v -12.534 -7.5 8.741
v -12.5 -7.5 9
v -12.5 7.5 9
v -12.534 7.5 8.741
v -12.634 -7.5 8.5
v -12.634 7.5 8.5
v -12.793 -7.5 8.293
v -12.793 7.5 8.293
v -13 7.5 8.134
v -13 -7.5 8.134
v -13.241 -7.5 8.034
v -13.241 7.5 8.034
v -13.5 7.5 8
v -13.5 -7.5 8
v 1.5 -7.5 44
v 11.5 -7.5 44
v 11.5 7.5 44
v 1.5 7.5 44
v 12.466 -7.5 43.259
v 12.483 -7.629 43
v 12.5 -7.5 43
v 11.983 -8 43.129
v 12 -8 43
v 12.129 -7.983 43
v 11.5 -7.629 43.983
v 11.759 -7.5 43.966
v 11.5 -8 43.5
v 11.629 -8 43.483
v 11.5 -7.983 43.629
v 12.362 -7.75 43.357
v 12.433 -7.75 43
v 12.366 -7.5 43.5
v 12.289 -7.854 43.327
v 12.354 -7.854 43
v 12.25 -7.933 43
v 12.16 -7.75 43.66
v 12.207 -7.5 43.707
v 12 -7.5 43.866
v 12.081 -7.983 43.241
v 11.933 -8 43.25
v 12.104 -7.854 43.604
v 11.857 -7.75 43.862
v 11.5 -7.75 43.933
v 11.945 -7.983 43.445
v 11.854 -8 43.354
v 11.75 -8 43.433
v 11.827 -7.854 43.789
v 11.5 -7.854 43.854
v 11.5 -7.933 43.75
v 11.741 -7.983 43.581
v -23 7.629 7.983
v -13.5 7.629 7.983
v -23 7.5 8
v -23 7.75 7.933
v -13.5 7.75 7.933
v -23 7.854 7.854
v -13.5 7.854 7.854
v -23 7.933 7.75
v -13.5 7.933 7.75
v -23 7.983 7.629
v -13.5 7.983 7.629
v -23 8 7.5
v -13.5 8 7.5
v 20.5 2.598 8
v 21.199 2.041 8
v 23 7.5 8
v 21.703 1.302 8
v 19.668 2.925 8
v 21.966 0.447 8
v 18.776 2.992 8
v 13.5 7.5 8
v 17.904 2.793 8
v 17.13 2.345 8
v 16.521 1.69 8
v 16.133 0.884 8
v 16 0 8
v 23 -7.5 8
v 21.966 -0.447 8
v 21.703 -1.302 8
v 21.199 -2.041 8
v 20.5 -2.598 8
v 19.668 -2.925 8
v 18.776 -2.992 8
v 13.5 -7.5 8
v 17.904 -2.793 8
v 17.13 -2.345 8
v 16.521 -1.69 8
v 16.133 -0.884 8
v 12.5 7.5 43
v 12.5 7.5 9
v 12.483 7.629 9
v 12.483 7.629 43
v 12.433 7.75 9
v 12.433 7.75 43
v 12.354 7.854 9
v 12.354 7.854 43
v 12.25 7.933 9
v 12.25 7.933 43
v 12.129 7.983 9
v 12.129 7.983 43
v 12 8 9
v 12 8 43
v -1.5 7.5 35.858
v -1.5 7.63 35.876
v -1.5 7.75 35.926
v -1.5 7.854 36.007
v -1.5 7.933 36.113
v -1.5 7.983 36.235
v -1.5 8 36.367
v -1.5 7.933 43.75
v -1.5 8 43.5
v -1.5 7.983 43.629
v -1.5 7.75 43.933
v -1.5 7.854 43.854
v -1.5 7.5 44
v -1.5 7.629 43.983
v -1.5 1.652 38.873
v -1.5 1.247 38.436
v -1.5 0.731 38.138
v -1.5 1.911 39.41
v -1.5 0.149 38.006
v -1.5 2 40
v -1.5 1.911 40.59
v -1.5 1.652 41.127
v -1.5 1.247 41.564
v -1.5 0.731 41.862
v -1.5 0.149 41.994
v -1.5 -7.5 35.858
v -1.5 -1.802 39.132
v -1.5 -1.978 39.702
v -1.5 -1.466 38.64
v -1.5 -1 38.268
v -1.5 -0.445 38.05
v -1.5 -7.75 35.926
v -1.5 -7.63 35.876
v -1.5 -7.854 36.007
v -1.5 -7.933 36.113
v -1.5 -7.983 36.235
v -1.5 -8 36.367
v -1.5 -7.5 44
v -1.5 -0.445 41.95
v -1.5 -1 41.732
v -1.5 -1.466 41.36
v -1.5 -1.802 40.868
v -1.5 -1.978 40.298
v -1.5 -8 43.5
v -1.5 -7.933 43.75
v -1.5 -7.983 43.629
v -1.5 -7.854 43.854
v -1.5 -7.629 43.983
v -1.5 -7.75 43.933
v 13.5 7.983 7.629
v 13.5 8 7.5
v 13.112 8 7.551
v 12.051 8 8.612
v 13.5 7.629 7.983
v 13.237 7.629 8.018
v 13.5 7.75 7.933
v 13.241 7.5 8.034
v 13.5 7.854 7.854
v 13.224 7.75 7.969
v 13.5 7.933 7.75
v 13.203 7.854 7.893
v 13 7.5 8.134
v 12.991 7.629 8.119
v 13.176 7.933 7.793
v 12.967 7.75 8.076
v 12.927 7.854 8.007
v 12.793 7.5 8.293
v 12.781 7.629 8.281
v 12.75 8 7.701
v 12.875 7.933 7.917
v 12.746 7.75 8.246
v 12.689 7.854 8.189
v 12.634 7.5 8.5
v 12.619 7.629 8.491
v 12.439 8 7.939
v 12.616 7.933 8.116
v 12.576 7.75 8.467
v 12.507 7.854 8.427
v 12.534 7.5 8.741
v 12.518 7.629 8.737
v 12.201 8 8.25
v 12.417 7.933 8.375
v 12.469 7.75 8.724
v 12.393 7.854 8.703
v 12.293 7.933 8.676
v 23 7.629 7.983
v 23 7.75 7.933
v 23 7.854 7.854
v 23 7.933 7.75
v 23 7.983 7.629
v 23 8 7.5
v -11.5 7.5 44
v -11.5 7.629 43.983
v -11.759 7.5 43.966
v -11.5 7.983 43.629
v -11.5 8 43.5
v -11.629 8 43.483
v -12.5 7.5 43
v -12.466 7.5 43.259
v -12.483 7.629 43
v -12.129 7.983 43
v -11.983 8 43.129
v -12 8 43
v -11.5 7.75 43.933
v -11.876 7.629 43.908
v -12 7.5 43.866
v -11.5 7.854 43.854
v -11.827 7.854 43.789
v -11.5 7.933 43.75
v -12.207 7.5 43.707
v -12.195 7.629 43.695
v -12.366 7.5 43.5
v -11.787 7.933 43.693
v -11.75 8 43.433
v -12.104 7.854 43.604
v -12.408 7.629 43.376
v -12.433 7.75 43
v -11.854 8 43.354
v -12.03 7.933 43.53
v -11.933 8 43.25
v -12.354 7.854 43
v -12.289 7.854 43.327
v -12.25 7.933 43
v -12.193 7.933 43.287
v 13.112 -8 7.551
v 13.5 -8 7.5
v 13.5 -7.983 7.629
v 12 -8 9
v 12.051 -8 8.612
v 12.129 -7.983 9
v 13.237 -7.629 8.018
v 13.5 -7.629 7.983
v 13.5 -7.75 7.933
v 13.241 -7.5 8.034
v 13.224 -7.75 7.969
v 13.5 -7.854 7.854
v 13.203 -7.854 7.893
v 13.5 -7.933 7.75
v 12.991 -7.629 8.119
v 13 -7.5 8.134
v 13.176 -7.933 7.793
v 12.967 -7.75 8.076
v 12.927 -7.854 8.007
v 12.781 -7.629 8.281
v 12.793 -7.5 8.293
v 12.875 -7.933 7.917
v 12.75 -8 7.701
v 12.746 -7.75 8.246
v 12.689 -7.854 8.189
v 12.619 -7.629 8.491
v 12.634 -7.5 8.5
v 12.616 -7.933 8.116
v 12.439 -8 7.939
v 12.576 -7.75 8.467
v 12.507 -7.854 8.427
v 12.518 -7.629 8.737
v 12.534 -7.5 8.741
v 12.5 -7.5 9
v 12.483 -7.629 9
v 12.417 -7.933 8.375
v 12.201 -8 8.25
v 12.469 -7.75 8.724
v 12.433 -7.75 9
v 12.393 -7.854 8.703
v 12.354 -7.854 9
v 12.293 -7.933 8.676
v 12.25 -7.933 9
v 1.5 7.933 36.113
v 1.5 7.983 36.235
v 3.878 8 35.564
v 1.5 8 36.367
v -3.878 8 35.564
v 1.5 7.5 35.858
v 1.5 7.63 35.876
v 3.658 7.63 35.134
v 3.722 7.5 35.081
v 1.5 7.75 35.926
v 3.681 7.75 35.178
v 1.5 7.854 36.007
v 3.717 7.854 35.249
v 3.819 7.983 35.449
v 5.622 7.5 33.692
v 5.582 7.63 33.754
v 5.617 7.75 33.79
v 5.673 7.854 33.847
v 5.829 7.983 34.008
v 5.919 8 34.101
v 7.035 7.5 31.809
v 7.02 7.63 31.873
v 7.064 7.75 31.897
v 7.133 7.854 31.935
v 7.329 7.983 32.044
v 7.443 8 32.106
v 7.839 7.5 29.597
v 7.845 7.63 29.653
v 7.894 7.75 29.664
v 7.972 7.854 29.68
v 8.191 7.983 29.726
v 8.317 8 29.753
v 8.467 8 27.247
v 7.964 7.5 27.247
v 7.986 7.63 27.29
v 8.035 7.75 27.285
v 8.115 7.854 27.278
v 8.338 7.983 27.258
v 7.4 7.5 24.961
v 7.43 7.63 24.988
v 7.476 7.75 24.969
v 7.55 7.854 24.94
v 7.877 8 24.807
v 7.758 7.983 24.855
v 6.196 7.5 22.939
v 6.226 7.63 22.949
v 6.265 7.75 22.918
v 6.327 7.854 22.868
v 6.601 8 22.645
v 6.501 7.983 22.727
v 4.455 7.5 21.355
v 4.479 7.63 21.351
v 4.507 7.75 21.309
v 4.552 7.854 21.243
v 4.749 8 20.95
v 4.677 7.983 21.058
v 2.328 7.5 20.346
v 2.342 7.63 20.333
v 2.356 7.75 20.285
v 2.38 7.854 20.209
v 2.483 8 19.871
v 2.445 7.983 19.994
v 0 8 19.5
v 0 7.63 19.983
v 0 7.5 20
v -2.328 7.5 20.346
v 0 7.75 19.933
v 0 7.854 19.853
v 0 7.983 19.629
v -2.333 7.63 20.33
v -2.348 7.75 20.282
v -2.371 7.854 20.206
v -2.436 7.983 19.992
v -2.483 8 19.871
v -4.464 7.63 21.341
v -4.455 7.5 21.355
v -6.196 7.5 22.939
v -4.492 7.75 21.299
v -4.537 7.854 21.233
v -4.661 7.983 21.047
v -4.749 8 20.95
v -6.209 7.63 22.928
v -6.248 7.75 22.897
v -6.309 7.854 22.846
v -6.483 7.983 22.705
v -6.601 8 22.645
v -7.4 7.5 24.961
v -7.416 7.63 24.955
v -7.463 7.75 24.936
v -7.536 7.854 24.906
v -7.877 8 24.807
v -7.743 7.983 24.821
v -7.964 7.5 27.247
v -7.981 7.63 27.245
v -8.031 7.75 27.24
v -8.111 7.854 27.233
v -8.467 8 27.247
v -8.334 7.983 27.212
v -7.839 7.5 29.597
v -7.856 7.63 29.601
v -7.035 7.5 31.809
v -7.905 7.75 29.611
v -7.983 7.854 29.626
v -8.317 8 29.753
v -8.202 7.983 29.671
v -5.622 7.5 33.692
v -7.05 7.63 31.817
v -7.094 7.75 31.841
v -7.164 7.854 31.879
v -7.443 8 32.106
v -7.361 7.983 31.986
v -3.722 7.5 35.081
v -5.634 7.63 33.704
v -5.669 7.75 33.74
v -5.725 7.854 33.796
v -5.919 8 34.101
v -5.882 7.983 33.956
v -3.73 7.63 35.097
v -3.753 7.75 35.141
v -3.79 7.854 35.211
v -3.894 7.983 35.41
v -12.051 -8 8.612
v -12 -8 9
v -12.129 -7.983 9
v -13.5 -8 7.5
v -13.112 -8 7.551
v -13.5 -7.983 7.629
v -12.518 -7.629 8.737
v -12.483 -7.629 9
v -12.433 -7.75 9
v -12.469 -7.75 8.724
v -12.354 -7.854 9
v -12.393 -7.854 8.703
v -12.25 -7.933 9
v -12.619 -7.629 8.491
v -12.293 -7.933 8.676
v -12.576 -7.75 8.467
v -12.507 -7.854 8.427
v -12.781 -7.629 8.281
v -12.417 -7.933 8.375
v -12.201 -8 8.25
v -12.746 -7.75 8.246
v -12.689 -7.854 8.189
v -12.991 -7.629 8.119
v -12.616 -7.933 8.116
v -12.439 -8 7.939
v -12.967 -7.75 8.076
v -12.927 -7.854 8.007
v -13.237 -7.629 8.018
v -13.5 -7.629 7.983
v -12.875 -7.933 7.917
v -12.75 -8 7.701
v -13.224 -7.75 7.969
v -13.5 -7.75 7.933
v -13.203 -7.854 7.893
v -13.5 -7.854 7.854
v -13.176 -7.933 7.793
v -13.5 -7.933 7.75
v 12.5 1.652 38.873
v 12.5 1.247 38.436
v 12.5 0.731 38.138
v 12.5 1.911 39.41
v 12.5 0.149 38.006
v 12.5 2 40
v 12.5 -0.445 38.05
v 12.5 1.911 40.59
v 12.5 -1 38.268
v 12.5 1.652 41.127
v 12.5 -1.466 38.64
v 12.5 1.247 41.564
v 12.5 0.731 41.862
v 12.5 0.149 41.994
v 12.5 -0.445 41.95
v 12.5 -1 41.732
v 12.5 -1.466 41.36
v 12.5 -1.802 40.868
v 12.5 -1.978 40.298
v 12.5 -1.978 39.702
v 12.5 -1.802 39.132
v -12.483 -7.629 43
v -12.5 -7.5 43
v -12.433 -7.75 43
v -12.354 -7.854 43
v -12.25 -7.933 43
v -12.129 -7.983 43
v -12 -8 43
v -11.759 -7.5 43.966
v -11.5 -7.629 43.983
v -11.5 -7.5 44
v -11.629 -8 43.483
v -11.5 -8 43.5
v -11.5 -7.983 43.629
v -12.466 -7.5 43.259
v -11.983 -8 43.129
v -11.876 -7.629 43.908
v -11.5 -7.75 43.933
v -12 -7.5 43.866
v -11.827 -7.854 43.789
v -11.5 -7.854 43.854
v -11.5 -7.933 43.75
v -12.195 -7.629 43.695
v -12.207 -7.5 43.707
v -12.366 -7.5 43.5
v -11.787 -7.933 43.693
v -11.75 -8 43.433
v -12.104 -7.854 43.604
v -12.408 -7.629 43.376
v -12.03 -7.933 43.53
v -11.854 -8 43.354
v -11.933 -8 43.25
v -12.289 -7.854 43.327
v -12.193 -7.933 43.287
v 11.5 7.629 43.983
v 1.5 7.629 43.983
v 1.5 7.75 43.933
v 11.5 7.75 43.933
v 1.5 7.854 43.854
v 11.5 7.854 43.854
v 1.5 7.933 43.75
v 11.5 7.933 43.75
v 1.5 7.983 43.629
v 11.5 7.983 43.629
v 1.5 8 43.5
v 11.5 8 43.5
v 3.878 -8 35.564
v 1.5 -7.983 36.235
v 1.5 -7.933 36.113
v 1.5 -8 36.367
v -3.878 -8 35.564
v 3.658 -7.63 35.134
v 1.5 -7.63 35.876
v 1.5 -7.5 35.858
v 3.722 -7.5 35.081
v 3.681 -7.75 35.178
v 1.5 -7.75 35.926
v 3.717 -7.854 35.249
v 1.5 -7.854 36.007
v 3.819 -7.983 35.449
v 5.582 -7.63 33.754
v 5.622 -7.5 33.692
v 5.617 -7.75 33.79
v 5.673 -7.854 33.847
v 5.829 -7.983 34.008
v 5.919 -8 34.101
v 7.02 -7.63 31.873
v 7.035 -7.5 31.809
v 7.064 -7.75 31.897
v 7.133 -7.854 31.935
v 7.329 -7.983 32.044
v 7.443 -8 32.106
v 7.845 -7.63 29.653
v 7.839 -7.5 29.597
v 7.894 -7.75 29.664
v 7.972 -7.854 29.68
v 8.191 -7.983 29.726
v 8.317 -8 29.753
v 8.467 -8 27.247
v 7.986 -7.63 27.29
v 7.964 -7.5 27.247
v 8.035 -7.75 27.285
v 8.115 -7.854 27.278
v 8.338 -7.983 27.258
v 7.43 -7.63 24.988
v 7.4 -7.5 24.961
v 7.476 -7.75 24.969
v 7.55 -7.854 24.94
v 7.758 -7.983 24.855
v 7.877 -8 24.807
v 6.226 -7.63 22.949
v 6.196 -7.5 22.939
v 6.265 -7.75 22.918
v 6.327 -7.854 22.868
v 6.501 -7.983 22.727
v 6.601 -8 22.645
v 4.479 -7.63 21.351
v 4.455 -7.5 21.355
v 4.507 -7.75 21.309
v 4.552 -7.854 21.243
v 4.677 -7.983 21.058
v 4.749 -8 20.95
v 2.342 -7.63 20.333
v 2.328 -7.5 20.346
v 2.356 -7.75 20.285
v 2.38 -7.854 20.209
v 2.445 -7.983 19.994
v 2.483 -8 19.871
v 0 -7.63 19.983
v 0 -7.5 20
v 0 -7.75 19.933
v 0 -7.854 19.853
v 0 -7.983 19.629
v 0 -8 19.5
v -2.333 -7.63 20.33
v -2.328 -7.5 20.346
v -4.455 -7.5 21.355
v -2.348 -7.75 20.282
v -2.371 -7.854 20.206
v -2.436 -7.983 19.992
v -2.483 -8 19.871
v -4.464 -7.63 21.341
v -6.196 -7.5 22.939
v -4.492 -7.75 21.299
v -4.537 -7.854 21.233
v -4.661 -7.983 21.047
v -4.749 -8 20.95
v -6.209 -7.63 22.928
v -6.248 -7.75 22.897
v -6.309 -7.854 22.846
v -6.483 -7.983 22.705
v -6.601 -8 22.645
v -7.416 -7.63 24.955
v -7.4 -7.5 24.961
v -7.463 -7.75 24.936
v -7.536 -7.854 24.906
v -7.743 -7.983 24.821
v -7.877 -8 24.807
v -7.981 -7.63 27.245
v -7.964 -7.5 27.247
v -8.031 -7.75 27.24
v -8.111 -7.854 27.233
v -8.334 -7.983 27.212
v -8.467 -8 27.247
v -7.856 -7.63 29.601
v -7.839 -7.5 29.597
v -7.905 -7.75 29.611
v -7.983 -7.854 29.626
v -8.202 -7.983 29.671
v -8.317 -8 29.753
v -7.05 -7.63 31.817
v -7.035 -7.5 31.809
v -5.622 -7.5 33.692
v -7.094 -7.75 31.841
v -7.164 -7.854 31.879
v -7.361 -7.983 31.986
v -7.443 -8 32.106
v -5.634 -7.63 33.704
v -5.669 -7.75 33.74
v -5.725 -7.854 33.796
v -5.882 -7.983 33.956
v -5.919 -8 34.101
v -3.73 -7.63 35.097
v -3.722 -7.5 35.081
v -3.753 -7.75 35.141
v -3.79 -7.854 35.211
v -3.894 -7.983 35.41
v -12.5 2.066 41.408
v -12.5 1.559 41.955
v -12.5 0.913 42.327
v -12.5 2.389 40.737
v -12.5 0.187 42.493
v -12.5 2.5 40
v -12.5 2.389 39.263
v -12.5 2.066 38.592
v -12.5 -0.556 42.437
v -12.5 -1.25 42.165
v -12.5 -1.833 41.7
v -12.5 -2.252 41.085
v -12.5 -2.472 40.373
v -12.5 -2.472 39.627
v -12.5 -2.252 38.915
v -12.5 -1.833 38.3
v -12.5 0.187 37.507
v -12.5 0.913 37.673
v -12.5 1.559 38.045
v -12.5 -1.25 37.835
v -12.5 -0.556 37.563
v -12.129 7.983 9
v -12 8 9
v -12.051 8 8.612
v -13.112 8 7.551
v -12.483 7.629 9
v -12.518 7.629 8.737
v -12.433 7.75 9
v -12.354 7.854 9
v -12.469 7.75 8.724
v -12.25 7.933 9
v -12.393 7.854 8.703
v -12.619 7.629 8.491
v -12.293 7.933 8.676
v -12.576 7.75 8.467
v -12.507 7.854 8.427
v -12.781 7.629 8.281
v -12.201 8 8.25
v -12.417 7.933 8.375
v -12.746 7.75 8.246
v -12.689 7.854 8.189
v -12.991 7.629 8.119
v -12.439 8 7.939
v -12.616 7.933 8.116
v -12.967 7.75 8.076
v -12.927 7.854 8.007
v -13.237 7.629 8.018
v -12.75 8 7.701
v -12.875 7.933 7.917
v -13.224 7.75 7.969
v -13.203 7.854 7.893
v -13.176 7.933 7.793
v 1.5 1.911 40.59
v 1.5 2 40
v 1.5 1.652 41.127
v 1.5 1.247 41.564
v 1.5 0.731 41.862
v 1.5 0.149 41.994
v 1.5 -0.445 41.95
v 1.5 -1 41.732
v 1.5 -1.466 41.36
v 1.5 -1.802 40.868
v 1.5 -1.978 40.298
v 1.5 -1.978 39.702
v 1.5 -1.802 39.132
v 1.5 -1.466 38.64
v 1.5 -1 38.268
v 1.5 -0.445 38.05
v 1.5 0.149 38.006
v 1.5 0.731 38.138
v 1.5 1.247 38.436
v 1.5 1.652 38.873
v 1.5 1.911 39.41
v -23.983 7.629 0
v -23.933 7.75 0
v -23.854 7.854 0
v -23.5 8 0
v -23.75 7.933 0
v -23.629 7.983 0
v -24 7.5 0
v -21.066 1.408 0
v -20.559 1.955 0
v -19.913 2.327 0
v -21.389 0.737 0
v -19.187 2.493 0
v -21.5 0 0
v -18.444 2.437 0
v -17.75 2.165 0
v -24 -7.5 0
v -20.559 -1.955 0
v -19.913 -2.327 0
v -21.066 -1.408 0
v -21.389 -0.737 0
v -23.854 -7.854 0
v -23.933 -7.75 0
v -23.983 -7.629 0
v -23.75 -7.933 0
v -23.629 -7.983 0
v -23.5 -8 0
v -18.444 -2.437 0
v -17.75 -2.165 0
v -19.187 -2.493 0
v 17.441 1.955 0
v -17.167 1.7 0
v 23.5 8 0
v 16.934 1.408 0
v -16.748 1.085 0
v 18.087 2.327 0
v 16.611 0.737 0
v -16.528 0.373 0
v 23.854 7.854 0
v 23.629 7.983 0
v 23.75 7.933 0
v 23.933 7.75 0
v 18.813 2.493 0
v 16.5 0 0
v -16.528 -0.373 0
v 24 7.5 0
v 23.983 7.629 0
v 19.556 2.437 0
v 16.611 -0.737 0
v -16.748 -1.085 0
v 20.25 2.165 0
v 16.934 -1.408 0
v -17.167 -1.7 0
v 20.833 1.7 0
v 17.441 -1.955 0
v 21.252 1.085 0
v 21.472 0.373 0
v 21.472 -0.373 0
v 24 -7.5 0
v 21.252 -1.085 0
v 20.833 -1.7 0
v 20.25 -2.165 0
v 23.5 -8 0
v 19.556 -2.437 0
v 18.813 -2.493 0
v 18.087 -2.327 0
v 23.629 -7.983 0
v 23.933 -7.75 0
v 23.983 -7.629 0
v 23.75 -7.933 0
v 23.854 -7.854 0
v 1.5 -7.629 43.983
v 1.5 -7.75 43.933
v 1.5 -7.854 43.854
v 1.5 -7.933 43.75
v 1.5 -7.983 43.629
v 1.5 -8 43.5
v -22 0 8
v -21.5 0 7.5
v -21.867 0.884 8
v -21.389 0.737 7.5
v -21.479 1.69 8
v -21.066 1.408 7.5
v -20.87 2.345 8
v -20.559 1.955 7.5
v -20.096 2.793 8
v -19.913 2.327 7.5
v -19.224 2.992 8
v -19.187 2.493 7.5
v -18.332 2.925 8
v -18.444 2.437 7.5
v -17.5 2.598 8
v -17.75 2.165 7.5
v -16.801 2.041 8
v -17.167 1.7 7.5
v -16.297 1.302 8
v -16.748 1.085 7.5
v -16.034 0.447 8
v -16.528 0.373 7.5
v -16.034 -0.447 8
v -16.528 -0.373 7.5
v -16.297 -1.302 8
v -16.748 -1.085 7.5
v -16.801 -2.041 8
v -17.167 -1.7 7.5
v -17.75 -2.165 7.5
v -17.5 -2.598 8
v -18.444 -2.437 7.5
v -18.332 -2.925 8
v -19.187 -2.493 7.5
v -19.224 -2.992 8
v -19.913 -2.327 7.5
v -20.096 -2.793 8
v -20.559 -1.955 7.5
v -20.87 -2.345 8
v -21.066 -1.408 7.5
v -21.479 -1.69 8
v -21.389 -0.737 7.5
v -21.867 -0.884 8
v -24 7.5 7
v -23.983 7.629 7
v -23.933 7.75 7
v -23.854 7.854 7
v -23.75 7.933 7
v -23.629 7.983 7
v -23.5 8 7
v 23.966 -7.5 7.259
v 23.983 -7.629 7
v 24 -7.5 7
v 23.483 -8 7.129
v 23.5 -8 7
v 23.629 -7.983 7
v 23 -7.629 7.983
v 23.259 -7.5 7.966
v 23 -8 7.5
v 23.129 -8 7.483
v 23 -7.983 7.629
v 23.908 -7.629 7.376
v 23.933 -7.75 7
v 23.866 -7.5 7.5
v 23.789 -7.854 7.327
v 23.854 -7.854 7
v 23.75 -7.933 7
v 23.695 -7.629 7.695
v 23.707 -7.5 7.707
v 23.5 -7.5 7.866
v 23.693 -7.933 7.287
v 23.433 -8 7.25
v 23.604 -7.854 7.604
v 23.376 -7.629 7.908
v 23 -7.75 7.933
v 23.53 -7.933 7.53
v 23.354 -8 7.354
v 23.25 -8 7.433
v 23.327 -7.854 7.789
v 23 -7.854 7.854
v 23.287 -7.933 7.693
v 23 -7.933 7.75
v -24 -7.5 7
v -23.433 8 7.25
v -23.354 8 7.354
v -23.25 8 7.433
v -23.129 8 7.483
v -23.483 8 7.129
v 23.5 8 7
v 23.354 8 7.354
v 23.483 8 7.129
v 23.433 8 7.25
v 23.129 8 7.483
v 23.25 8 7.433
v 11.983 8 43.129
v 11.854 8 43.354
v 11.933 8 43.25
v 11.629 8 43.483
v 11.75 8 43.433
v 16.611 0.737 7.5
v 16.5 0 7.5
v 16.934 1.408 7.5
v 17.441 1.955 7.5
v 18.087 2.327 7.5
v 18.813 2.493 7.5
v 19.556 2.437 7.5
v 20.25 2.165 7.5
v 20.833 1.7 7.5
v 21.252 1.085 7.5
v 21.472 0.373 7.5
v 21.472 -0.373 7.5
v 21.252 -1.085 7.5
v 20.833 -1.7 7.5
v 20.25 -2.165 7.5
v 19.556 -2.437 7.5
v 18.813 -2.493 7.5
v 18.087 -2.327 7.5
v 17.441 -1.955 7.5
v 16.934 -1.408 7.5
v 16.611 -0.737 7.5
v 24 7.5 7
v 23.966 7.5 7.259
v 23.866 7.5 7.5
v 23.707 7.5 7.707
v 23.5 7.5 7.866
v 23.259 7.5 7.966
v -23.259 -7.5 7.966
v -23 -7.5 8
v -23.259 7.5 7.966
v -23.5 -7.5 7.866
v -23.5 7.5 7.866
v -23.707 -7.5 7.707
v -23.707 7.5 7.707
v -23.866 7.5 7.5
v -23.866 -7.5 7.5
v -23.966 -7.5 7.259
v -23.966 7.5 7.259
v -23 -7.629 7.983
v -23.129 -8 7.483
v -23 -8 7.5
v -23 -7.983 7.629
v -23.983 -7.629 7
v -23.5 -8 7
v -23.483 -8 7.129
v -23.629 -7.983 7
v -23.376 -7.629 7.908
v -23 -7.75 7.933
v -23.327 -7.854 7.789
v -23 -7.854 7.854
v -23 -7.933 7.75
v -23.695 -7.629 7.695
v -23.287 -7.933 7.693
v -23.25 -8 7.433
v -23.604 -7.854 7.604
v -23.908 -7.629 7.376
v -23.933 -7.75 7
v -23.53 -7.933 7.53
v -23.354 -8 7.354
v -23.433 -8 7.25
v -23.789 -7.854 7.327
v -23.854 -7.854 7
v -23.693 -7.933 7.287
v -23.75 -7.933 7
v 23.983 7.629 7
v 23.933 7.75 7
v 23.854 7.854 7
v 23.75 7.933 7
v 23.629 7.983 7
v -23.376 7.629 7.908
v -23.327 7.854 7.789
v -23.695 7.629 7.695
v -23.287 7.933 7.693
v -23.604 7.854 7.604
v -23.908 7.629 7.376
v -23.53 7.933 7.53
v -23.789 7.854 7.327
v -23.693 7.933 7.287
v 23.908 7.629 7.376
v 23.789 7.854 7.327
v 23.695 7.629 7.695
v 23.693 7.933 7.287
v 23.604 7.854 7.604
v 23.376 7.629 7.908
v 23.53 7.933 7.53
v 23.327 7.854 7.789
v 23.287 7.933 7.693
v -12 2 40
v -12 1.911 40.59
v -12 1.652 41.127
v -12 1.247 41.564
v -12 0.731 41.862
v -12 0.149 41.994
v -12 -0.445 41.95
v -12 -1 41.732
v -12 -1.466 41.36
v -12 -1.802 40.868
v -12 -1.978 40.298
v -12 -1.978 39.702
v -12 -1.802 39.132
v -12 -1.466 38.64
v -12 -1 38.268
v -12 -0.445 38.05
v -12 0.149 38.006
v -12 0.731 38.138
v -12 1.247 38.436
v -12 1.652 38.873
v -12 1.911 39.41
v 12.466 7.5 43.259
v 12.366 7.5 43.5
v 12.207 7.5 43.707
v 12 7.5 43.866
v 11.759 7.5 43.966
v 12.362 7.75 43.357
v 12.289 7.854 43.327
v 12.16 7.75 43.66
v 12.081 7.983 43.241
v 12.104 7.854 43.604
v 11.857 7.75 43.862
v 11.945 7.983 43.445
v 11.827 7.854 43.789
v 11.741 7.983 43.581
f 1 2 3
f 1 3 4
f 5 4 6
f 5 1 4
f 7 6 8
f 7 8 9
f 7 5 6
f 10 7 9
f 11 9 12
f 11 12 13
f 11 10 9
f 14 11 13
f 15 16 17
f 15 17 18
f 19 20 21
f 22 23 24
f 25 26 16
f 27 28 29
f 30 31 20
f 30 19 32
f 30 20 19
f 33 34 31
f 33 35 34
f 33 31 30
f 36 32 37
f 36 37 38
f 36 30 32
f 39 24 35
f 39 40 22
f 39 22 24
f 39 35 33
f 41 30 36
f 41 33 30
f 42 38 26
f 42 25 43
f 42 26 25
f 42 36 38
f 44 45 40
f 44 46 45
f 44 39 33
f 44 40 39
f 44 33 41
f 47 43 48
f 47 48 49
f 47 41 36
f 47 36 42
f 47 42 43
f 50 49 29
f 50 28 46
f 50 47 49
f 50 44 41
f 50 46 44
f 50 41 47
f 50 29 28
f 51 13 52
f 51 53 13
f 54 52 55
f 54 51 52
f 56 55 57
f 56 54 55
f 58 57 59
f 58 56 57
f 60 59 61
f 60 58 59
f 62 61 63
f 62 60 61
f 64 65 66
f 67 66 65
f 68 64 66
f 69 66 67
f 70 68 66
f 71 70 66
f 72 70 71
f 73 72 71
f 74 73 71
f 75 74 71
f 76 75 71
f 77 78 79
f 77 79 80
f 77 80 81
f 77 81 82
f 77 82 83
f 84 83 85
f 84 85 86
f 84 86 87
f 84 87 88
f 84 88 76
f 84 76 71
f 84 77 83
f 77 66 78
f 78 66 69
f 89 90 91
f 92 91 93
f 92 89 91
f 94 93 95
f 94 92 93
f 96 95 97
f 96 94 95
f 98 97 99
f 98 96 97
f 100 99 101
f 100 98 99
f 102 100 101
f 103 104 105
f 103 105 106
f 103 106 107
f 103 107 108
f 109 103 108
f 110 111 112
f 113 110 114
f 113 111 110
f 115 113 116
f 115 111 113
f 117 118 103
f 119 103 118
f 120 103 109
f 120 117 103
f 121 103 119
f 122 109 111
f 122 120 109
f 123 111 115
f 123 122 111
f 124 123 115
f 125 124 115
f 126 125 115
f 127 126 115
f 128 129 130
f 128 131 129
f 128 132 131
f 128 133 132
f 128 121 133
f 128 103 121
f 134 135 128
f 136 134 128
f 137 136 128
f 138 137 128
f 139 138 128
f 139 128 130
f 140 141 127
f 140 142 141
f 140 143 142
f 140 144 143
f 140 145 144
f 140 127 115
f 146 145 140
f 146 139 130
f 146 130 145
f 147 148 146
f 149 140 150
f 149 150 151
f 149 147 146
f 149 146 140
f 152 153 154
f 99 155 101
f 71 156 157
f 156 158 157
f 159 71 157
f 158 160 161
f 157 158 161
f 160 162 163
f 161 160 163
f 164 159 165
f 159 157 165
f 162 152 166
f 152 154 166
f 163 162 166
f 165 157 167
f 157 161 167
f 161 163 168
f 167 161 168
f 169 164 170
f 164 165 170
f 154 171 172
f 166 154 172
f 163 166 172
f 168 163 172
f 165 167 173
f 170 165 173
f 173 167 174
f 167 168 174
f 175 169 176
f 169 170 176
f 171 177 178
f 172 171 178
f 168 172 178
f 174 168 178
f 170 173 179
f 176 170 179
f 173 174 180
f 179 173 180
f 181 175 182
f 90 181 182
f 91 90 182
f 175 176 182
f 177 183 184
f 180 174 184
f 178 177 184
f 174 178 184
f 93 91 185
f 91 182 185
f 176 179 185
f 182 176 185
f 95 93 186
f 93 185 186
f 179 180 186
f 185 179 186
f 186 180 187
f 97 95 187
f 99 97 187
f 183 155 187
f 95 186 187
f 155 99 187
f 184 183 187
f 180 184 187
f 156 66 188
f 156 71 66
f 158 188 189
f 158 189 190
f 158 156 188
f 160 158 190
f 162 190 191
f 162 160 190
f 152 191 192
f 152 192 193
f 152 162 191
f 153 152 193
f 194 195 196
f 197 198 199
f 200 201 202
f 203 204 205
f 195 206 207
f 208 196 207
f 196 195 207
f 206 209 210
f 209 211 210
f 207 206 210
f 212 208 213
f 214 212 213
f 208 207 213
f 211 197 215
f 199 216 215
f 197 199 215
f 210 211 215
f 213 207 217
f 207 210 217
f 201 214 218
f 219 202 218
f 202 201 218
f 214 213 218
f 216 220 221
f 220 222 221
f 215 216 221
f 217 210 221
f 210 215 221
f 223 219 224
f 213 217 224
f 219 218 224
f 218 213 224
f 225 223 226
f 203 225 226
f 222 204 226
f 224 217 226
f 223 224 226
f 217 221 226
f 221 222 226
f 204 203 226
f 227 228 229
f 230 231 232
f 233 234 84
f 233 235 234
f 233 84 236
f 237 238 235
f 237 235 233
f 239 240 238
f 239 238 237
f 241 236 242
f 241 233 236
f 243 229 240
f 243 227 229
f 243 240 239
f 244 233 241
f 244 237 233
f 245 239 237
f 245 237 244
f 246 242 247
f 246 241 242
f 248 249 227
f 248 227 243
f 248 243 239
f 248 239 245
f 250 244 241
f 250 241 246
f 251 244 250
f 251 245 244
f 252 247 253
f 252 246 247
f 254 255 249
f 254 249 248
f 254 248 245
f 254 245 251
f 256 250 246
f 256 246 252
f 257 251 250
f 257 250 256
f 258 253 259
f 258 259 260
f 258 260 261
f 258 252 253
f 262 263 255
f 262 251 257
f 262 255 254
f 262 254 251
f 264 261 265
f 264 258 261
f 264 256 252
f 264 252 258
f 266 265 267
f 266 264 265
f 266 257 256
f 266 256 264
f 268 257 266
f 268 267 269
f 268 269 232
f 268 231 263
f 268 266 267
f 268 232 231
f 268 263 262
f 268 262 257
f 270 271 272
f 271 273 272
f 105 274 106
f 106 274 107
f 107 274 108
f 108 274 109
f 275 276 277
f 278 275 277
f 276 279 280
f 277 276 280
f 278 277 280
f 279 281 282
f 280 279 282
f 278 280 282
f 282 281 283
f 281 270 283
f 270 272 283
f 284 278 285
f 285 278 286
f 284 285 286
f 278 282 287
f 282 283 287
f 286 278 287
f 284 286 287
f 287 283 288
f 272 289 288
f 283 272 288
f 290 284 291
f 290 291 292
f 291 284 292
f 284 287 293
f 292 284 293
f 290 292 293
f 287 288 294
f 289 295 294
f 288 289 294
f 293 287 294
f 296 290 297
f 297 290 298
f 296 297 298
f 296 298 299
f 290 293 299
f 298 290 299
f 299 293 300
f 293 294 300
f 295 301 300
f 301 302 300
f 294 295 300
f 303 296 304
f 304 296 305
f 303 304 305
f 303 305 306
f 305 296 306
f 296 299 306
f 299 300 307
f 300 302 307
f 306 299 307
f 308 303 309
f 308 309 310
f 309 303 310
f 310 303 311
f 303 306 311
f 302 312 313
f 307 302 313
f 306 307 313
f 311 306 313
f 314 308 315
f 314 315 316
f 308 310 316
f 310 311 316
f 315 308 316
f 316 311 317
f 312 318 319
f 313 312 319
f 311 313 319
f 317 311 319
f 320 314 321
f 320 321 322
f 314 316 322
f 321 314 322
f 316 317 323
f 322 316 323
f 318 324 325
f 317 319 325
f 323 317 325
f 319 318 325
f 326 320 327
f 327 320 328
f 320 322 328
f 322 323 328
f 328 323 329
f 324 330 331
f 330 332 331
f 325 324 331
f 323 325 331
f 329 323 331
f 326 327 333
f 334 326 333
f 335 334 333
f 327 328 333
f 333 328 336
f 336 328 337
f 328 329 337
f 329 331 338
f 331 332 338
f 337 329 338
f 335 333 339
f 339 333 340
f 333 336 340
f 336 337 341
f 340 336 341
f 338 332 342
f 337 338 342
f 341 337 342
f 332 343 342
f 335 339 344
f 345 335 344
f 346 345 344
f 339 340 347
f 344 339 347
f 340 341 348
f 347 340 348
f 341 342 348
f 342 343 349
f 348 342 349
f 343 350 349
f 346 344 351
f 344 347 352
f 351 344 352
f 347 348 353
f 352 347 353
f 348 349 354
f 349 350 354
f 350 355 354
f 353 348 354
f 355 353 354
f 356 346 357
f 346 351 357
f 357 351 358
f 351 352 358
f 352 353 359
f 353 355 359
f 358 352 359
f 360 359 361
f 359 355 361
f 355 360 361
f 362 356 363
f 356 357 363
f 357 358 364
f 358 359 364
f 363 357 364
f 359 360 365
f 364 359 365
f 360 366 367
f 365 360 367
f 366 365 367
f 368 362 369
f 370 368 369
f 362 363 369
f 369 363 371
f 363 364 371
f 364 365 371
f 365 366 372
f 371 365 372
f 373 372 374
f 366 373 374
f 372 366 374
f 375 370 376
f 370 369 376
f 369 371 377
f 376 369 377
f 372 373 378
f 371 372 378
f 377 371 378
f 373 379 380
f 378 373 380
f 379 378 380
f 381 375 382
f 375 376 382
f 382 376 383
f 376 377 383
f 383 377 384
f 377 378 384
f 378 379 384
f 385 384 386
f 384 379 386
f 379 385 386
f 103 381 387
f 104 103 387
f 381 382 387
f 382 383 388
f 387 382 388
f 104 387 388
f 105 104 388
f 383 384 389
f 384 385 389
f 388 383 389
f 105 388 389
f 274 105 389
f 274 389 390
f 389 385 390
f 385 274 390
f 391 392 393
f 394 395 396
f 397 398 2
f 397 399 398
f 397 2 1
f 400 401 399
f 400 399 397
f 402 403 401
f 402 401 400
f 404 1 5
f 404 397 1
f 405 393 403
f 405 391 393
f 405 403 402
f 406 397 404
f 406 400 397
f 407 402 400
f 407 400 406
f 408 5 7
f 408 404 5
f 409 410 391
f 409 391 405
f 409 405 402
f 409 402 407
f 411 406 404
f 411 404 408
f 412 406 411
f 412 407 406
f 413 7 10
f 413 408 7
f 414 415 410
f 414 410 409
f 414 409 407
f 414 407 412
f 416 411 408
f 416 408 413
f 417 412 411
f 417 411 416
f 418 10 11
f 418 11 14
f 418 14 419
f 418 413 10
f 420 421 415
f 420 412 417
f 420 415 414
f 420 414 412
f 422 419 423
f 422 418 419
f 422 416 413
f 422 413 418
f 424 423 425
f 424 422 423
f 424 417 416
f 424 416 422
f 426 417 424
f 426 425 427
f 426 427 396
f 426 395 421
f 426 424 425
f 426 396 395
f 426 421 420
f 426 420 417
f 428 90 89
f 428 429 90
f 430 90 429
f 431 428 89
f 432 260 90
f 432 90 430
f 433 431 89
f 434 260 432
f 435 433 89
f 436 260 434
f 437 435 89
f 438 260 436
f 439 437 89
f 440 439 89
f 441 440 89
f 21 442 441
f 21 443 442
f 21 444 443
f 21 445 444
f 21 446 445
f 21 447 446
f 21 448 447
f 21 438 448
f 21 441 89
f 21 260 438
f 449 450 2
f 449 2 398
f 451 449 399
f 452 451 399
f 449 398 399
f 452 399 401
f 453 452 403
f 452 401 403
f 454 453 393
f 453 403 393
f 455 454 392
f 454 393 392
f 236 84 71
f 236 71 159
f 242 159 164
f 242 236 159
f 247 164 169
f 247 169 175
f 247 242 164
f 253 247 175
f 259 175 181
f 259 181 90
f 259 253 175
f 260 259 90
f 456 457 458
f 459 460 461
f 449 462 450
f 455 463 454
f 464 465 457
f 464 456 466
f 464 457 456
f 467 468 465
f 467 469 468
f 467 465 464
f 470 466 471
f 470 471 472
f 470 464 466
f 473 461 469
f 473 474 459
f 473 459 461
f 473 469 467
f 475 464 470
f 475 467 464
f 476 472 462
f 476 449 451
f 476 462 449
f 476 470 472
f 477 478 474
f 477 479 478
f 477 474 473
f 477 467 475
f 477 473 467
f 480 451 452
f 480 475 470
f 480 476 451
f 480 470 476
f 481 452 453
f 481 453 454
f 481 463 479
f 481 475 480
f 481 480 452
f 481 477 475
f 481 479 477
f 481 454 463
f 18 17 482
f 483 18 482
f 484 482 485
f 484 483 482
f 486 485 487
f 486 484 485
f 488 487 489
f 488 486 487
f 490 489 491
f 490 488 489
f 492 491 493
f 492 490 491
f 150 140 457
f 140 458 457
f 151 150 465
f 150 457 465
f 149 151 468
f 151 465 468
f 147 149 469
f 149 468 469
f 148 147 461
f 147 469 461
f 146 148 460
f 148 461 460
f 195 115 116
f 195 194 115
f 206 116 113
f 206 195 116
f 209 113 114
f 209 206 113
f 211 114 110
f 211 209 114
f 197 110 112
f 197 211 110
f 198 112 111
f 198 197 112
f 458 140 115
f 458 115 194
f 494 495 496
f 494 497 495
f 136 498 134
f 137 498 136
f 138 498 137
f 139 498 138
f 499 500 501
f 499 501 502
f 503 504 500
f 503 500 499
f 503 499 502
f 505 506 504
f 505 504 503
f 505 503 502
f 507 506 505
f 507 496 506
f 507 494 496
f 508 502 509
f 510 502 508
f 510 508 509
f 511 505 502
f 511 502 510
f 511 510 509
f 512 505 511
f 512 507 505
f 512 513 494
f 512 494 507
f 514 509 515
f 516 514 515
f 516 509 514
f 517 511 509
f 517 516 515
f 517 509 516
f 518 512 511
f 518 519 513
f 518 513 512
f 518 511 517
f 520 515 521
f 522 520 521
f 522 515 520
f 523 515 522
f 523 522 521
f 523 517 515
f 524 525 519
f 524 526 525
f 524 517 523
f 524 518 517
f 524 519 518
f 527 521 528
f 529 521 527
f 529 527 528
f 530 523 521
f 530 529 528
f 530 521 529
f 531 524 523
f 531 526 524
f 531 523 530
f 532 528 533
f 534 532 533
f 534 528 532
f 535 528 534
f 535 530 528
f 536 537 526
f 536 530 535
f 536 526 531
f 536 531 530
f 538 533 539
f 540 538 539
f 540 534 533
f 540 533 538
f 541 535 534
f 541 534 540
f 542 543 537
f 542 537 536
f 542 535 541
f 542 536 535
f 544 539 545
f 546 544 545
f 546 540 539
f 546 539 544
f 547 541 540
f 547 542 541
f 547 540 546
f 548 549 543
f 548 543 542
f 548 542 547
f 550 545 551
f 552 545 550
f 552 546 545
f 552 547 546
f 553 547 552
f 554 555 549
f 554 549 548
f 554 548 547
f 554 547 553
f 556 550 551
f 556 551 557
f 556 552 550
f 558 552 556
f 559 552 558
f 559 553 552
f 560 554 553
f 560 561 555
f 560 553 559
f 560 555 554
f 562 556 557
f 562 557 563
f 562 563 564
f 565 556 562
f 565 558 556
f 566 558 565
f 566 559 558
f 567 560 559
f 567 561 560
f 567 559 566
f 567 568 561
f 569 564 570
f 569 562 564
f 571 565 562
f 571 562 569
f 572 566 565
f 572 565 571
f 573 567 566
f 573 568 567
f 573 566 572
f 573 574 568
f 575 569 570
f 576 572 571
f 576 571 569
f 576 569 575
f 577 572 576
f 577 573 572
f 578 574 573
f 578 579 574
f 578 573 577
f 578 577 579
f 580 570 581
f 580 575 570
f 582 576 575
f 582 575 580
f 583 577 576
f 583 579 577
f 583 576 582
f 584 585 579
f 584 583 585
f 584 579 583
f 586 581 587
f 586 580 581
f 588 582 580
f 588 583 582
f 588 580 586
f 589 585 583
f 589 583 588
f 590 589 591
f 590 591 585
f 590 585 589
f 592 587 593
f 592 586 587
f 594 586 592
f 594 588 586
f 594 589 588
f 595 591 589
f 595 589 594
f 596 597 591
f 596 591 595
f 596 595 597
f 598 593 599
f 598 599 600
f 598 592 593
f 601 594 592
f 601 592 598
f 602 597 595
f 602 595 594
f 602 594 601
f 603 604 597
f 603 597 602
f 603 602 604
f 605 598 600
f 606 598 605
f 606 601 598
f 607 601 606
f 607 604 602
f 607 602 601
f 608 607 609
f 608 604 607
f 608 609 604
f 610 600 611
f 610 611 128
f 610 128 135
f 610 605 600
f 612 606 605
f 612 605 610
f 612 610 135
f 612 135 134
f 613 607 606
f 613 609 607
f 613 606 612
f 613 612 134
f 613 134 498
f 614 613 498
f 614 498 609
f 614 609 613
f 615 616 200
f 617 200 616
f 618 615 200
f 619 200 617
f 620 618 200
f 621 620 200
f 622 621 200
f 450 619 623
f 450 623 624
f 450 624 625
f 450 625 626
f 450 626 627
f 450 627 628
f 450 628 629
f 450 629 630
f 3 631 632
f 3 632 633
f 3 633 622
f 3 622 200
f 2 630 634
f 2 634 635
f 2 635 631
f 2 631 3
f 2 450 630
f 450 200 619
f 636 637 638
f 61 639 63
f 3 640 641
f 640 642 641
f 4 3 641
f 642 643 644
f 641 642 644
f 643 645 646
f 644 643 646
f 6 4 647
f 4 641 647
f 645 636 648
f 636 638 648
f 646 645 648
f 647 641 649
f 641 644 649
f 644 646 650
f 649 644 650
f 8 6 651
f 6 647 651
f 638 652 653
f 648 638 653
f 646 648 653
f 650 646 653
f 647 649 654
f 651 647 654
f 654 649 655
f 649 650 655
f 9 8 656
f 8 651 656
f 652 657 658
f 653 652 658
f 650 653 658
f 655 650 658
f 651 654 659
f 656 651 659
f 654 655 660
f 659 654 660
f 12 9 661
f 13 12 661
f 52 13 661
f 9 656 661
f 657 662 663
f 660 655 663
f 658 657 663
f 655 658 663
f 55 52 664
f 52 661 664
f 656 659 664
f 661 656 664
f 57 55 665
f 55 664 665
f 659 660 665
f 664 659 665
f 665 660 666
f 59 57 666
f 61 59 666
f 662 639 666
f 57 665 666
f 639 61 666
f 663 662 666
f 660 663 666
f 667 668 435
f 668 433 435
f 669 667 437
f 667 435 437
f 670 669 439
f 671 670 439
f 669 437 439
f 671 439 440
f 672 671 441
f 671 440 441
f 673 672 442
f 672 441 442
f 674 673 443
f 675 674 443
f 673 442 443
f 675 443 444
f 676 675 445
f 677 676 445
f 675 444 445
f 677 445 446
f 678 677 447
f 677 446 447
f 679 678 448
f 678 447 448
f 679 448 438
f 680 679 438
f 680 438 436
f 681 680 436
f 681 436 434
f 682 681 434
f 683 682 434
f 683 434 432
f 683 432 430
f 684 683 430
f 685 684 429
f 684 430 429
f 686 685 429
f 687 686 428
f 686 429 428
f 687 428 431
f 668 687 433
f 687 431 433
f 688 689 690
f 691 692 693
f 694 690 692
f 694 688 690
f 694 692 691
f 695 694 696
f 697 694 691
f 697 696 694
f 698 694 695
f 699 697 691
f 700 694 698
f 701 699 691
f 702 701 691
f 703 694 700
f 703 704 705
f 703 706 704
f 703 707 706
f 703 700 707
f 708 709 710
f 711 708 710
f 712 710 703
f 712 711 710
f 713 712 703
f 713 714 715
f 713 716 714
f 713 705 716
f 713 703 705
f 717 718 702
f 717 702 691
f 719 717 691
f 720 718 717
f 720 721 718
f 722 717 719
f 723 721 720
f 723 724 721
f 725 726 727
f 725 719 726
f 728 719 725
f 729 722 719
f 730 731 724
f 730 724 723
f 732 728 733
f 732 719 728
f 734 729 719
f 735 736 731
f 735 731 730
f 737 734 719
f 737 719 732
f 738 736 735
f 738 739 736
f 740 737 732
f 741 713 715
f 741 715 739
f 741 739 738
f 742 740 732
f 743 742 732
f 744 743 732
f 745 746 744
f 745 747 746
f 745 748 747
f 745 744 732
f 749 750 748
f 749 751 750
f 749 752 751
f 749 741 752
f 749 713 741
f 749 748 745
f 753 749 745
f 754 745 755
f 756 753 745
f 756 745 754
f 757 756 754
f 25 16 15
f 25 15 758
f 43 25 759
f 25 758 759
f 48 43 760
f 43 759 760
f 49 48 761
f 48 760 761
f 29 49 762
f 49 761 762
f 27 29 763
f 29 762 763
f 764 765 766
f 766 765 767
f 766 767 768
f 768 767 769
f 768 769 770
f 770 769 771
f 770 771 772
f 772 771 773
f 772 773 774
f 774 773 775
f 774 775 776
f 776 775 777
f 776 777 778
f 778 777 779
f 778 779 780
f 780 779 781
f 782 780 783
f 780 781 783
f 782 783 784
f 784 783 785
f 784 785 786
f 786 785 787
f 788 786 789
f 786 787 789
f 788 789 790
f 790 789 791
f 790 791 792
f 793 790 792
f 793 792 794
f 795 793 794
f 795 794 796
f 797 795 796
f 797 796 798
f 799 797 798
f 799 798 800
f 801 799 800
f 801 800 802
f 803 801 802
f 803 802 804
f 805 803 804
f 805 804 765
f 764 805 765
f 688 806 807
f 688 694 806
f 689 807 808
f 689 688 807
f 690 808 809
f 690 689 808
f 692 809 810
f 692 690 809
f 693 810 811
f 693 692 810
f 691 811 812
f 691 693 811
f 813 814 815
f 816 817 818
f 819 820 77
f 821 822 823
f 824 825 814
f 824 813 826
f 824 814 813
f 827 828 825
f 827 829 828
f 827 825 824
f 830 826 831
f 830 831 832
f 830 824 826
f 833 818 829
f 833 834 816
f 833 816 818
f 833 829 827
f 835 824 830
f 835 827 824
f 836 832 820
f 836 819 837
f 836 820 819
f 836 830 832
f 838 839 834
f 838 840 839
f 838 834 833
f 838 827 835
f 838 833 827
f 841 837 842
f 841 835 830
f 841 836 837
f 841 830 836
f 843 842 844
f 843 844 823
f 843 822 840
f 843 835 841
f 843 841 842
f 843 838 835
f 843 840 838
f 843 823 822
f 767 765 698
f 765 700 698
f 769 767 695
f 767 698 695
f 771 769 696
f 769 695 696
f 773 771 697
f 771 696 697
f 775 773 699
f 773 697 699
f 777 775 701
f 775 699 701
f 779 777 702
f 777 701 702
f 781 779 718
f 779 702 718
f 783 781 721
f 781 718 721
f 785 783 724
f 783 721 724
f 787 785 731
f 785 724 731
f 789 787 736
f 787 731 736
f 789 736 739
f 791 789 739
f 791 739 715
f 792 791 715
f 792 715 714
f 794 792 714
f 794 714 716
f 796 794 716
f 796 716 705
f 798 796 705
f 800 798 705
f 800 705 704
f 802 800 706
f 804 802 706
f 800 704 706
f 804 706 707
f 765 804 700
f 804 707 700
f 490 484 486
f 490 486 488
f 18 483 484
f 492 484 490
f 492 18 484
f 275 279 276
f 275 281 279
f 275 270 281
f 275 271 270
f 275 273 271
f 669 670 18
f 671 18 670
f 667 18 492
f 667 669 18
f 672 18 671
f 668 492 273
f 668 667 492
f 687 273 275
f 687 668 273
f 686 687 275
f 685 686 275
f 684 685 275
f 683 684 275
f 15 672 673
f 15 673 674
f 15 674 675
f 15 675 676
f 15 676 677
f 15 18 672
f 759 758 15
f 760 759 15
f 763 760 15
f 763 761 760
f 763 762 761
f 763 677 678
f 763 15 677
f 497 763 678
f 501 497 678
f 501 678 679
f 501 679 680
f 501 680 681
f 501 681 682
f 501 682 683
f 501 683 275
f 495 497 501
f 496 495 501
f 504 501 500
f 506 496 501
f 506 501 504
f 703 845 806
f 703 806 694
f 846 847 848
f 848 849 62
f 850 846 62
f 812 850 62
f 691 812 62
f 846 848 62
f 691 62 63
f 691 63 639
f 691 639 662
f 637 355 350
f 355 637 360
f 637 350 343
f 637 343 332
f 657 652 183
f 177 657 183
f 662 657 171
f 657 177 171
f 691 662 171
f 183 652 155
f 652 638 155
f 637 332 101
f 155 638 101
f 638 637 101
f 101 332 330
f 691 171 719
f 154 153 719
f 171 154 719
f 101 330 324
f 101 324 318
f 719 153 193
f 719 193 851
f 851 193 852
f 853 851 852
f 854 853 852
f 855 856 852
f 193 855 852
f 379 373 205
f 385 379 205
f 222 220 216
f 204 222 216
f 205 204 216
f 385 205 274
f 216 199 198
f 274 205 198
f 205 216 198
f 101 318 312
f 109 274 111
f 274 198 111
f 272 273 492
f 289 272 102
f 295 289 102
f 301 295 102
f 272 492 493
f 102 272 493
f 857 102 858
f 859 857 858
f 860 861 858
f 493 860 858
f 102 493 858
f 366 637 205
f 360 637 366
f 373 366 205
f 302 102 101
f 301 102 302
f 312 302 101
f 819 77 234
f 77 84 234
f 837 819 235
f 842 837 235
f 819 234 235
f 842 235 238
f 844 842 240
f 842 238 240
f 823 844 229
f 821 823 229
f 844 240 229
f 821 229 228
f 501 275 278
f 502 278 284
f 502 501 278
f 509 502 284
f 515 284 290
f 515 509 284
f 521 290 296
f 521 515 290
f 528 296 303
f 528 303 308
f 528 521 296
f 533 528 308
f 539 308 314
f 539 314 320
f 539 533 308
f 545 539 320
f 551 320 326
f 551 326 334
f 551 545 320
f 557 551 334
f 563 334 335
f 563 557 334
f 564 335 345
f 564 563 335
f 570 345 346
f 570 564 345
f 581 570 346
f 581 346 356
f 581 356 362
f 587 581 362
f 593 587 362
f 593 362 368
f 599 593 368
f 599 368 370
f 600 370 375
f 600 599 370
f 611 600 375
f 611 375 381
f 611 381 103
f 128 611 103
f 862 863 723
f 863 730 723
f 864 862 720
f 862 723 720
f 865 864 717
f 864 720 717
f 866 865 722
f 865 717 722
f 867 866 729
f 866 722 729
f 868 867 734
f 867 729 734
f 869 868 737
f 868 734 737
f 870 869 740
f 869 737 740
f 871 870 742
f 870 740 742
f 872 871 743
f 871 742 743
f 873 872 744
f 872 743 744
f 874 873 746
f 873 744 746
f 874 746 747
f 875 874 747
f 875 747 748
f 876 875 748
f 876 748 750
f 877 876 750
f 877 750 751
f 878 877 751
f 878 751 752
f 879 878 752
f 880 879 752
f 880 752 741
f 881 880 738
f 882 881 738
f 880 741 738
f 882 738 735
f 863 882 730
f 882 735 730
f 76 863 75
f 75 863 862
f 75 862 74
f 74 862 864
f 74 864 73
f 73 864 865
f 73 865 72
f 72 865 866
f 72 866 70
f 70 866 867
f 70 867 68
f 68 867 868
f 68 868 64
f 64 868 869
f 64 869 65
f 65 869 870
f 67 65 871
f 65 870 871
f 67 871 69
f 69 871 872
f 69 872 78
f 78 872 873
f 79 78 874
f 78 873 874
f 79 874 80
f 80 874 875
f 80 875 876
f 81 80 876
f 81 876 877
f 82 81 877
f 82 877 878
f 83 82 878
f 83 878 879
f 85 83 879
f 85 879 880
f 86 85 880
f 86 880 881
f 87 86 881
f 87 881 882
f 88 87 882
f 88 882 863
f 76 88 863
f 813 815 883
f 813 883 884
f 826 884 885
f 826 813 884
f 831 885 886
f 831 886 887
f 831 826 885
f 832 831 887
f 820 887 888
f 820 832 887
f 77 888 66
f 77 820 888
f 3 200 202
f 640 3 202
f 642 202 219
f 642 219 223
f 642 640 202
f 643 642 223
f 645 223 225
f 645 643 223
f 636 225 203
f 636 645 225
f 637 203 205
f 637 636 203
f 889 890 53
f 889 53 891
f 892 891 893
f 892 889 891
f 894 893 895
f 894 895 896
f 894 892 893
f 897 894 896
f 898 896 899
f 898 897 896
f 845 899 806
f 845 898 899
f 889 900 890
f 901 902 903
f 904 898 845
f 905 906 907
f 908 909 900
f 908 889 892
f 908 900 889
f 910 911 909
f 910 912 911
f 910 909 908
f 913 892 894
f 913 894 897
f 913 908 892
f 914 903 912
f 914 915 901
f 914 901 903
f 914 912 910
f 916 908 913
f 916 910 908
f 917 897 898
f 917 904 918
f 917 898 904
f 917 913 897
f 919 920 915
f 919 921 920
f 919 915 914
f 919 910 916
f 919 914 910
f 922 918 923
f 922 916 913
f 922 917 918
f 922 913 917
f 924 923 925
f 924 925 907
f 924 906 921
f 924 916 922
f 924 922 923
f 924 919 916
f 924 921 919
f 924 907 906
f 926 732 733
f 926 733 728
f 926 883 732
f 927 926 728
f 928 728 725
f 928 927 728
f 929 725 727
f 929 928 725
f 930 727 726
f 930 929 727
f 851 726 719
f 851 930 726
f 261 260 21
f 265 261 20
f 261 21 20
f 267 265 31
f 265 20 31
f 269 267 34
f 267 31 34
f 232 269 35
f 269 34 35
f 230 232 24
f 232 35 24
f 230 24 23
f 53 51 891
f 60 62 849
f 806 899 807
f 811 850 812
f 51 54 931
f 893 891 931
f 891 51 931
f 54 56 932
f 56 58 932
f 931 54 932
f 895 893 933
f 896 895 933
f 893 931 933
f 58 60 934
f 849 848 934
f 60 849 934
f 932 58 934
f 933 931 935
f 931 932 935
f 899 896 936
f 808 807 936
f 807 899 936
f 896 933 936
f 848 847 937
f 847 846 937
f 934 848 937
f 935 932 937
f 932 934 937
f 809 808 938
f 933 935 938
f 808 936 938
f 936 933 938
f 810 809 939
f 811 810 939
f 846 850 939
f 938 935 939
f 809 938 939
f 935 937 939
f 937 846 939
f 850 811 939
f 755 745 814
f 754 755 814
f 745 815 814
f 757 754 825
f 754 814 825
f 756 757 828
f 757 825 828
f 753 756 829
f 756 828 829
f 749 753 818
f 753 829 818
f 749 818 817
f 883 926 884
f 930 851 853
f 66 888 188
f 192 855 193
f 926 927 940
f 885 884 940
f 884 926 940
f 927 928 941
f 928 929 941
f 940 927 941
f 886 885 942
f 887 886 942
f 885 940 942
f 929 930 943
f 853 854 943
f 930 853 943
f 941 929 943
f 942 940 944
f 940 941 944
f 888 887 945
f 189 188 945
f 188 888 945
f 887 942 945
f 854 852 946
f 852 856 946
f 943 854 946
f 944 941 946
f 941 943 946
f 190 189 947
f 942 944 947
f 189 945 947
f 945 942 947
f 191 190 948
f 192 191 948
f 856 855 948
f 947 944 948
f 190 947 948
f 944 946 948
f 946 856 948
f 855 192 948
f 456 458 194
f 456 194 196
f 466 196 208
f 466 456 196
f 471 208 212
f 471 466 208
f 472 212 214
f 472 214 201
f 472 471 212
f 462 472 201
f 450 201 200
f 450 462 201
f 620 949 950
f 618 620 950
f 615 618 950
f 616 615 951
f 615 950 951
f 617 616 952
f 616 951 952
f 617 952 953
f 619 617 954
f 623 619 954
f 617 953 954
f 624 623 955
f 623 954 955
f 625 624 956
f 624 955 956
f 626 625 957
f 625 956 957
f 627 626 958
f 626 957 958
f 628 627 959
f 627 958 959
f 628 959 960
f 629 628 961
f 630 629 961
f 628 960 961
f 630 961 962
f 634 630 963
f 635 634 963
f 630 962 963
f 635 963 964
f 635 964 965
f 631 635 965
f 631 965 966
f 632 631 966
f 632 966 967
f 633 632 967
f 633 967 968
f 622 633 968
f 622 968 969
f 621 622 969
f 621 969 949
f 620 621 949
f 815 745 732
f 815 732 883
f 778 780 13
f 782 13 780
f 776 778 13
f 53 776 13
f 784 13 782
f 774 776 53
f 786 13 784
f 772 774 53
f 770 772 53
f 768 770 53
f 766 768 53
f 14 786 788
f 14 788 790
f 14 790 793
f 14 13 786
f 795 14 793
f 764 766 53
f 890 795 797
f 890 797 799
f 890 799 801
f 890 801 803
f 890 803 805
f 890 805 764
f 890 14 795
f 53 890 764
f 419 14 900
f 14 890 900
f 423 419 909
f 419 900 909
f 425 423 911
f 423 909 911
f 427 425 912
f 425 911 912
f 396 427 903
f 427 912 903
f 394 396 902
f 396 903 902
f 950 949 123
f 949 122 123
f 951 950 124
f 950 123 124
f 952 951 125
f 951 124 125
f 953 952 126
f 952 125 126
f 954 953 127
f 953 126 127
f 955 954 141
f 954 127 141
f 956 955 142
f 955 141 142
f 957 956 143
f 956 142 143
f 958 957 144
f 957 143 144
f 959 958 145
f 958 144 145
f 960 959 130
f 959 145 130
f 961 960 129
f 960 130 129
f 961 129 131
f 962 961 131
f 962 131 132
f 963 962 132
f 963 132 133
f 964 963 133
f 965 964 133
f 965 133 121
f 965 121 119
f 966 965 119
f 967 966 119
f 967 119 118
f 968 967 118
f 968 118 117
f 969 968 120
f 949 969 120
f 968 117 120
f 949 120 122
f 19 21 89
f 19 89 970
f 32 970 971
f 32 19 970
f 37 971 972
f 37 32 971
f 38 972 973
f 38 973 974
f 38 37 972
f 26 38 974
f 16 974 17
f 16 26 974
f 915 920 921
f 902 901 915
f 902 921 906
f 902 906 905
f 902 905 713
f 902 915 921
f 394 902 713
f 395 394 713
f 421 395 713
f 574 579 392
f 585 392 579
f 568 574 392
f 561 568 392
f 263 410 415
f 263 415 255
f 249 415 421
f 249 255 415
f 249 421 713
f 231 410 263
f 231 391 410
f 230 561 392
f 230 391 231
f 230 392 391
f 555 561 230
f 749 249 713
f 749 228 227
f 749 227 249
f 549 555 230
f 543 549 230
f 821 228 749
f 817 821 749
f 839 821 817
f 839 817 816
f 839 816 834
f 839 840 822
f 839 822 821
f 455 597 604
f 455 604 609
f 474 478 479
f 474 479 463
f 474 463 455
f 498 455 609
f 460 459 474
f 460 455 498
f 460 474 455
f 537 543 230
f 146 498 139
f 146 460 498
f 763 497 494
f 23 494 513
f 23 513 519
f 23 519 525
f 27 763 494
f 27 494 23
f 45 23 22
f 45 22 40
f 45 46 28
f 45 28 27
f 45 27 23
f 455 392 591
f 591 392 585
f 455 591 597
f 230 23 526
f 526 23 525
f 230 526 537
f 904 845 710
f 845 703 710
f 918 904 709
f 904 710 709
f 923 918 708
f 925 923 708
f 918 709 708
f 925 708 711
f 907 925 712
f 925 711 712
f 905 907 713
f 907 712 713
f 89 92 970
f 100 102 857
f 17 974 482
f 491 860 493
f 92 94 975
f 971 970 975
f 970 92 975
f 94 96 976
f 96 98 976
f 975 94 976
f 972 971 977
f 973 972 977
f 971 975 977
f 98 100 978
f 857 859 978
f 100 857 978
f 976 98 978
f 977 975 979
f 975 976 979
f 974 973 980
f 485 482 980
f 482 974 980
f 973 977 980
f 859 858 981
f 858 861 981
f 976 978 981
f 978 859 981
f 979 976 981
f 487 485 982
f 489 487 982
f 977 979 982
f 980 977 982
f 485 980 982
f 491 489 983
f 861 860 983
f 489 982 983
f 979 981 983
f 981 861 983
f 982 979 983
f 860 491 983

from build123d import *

# Parameters (mm, degrees)
F1_DEPTH       = 8
F3_D           = 5
F3_CSINK_D     = 6
F3_CSINK_ANGLE = 90
F4_R           = 0.5
F6_D           = 4
F6_CSINK_D     = 5
F6_CSINK_ANGLE = 90


with BuildPart() as f1:
    # F0 (on Front) → F1 (new body, symmetric)
    with BuildSketch(Plane.XZ):
        with BuildLine():
            Line((-24, 0), (24, 0))
            Line((24, 0), (24, 7))
            ThreePointArc((24, 7), (23.707107, 7.707107), (23, 8))
            Line((23, 8), (13.5, 8))
            ThreePointArc((13.5, 8), (12.792893, 8.292893), (12.5, 9))
            Line((12.5, 9), (12.5, 43))
            ThreePointArc((12.5, 43), (12.207107, 43.707107), (11.5, 44))
            Line((11.5, 44), (1.5, 44))
            Line((1.5, 44), (1.5, 35.858117))
            ThreePointArc((1.5, 35.858117), (0, 20), (-1.5, 35.858117))
            Line((-1.5, 35.858117), (-1.5, 44))
            Line((-1.5, 44), (-11.5, 44))
            ThreePointArc((-11.5, 44), (-12.207107, 43.707107), (-12.5, 43))
            Line((-12.5, 43), (-12.5, 9))
            ThreePointArc((-12.5, 9), (-12.792893, 8.292893), (-13.5, 8))
            Line((-13.5, 8), (-23, 8))
            ThreePointArc((-23, 8), (-23.707107, 7.707107), (-24, 7))
            Line((-24, 7), (-24, 0))
        make_face()
    extrude(amount=F1_DEPTH, both=True)

    # F3 (through all)
    with Locations(Plane.XY.offset(8)):
        with Locations((-19, 0), (19, 0)):
            CounterSinkHole(F3_D / 2, F3_CSINK_D / 2, counter_sink_angle=F3_CSINK_ANGLE)

    # F4
    f4_edges = [f1.edges().sort_by_distance(p)[0] for p in [
        (12.5, -8, 26),
        (-12.5, -8, 26),
        (-12.5, 8, 26),
        (12.5, 8, 26),
        (0, -8, 20),
        (0, 8, 20),
    ]]
    fillet(f4_edges, radius=F4_R)

    # F6 (through all)
    with Locations(Plane(origin=(-12.5, 0, 0), x_dir=(0, -1, 0), z_dir=(-1, 0, 0))):
        with Locations((0, 40)):
            CounterSinkHole(F6_D / 2, F6_CSINK_D / 2, counter_sink_angle=F6_CSINK_ANGLE)


solid = f1.part
